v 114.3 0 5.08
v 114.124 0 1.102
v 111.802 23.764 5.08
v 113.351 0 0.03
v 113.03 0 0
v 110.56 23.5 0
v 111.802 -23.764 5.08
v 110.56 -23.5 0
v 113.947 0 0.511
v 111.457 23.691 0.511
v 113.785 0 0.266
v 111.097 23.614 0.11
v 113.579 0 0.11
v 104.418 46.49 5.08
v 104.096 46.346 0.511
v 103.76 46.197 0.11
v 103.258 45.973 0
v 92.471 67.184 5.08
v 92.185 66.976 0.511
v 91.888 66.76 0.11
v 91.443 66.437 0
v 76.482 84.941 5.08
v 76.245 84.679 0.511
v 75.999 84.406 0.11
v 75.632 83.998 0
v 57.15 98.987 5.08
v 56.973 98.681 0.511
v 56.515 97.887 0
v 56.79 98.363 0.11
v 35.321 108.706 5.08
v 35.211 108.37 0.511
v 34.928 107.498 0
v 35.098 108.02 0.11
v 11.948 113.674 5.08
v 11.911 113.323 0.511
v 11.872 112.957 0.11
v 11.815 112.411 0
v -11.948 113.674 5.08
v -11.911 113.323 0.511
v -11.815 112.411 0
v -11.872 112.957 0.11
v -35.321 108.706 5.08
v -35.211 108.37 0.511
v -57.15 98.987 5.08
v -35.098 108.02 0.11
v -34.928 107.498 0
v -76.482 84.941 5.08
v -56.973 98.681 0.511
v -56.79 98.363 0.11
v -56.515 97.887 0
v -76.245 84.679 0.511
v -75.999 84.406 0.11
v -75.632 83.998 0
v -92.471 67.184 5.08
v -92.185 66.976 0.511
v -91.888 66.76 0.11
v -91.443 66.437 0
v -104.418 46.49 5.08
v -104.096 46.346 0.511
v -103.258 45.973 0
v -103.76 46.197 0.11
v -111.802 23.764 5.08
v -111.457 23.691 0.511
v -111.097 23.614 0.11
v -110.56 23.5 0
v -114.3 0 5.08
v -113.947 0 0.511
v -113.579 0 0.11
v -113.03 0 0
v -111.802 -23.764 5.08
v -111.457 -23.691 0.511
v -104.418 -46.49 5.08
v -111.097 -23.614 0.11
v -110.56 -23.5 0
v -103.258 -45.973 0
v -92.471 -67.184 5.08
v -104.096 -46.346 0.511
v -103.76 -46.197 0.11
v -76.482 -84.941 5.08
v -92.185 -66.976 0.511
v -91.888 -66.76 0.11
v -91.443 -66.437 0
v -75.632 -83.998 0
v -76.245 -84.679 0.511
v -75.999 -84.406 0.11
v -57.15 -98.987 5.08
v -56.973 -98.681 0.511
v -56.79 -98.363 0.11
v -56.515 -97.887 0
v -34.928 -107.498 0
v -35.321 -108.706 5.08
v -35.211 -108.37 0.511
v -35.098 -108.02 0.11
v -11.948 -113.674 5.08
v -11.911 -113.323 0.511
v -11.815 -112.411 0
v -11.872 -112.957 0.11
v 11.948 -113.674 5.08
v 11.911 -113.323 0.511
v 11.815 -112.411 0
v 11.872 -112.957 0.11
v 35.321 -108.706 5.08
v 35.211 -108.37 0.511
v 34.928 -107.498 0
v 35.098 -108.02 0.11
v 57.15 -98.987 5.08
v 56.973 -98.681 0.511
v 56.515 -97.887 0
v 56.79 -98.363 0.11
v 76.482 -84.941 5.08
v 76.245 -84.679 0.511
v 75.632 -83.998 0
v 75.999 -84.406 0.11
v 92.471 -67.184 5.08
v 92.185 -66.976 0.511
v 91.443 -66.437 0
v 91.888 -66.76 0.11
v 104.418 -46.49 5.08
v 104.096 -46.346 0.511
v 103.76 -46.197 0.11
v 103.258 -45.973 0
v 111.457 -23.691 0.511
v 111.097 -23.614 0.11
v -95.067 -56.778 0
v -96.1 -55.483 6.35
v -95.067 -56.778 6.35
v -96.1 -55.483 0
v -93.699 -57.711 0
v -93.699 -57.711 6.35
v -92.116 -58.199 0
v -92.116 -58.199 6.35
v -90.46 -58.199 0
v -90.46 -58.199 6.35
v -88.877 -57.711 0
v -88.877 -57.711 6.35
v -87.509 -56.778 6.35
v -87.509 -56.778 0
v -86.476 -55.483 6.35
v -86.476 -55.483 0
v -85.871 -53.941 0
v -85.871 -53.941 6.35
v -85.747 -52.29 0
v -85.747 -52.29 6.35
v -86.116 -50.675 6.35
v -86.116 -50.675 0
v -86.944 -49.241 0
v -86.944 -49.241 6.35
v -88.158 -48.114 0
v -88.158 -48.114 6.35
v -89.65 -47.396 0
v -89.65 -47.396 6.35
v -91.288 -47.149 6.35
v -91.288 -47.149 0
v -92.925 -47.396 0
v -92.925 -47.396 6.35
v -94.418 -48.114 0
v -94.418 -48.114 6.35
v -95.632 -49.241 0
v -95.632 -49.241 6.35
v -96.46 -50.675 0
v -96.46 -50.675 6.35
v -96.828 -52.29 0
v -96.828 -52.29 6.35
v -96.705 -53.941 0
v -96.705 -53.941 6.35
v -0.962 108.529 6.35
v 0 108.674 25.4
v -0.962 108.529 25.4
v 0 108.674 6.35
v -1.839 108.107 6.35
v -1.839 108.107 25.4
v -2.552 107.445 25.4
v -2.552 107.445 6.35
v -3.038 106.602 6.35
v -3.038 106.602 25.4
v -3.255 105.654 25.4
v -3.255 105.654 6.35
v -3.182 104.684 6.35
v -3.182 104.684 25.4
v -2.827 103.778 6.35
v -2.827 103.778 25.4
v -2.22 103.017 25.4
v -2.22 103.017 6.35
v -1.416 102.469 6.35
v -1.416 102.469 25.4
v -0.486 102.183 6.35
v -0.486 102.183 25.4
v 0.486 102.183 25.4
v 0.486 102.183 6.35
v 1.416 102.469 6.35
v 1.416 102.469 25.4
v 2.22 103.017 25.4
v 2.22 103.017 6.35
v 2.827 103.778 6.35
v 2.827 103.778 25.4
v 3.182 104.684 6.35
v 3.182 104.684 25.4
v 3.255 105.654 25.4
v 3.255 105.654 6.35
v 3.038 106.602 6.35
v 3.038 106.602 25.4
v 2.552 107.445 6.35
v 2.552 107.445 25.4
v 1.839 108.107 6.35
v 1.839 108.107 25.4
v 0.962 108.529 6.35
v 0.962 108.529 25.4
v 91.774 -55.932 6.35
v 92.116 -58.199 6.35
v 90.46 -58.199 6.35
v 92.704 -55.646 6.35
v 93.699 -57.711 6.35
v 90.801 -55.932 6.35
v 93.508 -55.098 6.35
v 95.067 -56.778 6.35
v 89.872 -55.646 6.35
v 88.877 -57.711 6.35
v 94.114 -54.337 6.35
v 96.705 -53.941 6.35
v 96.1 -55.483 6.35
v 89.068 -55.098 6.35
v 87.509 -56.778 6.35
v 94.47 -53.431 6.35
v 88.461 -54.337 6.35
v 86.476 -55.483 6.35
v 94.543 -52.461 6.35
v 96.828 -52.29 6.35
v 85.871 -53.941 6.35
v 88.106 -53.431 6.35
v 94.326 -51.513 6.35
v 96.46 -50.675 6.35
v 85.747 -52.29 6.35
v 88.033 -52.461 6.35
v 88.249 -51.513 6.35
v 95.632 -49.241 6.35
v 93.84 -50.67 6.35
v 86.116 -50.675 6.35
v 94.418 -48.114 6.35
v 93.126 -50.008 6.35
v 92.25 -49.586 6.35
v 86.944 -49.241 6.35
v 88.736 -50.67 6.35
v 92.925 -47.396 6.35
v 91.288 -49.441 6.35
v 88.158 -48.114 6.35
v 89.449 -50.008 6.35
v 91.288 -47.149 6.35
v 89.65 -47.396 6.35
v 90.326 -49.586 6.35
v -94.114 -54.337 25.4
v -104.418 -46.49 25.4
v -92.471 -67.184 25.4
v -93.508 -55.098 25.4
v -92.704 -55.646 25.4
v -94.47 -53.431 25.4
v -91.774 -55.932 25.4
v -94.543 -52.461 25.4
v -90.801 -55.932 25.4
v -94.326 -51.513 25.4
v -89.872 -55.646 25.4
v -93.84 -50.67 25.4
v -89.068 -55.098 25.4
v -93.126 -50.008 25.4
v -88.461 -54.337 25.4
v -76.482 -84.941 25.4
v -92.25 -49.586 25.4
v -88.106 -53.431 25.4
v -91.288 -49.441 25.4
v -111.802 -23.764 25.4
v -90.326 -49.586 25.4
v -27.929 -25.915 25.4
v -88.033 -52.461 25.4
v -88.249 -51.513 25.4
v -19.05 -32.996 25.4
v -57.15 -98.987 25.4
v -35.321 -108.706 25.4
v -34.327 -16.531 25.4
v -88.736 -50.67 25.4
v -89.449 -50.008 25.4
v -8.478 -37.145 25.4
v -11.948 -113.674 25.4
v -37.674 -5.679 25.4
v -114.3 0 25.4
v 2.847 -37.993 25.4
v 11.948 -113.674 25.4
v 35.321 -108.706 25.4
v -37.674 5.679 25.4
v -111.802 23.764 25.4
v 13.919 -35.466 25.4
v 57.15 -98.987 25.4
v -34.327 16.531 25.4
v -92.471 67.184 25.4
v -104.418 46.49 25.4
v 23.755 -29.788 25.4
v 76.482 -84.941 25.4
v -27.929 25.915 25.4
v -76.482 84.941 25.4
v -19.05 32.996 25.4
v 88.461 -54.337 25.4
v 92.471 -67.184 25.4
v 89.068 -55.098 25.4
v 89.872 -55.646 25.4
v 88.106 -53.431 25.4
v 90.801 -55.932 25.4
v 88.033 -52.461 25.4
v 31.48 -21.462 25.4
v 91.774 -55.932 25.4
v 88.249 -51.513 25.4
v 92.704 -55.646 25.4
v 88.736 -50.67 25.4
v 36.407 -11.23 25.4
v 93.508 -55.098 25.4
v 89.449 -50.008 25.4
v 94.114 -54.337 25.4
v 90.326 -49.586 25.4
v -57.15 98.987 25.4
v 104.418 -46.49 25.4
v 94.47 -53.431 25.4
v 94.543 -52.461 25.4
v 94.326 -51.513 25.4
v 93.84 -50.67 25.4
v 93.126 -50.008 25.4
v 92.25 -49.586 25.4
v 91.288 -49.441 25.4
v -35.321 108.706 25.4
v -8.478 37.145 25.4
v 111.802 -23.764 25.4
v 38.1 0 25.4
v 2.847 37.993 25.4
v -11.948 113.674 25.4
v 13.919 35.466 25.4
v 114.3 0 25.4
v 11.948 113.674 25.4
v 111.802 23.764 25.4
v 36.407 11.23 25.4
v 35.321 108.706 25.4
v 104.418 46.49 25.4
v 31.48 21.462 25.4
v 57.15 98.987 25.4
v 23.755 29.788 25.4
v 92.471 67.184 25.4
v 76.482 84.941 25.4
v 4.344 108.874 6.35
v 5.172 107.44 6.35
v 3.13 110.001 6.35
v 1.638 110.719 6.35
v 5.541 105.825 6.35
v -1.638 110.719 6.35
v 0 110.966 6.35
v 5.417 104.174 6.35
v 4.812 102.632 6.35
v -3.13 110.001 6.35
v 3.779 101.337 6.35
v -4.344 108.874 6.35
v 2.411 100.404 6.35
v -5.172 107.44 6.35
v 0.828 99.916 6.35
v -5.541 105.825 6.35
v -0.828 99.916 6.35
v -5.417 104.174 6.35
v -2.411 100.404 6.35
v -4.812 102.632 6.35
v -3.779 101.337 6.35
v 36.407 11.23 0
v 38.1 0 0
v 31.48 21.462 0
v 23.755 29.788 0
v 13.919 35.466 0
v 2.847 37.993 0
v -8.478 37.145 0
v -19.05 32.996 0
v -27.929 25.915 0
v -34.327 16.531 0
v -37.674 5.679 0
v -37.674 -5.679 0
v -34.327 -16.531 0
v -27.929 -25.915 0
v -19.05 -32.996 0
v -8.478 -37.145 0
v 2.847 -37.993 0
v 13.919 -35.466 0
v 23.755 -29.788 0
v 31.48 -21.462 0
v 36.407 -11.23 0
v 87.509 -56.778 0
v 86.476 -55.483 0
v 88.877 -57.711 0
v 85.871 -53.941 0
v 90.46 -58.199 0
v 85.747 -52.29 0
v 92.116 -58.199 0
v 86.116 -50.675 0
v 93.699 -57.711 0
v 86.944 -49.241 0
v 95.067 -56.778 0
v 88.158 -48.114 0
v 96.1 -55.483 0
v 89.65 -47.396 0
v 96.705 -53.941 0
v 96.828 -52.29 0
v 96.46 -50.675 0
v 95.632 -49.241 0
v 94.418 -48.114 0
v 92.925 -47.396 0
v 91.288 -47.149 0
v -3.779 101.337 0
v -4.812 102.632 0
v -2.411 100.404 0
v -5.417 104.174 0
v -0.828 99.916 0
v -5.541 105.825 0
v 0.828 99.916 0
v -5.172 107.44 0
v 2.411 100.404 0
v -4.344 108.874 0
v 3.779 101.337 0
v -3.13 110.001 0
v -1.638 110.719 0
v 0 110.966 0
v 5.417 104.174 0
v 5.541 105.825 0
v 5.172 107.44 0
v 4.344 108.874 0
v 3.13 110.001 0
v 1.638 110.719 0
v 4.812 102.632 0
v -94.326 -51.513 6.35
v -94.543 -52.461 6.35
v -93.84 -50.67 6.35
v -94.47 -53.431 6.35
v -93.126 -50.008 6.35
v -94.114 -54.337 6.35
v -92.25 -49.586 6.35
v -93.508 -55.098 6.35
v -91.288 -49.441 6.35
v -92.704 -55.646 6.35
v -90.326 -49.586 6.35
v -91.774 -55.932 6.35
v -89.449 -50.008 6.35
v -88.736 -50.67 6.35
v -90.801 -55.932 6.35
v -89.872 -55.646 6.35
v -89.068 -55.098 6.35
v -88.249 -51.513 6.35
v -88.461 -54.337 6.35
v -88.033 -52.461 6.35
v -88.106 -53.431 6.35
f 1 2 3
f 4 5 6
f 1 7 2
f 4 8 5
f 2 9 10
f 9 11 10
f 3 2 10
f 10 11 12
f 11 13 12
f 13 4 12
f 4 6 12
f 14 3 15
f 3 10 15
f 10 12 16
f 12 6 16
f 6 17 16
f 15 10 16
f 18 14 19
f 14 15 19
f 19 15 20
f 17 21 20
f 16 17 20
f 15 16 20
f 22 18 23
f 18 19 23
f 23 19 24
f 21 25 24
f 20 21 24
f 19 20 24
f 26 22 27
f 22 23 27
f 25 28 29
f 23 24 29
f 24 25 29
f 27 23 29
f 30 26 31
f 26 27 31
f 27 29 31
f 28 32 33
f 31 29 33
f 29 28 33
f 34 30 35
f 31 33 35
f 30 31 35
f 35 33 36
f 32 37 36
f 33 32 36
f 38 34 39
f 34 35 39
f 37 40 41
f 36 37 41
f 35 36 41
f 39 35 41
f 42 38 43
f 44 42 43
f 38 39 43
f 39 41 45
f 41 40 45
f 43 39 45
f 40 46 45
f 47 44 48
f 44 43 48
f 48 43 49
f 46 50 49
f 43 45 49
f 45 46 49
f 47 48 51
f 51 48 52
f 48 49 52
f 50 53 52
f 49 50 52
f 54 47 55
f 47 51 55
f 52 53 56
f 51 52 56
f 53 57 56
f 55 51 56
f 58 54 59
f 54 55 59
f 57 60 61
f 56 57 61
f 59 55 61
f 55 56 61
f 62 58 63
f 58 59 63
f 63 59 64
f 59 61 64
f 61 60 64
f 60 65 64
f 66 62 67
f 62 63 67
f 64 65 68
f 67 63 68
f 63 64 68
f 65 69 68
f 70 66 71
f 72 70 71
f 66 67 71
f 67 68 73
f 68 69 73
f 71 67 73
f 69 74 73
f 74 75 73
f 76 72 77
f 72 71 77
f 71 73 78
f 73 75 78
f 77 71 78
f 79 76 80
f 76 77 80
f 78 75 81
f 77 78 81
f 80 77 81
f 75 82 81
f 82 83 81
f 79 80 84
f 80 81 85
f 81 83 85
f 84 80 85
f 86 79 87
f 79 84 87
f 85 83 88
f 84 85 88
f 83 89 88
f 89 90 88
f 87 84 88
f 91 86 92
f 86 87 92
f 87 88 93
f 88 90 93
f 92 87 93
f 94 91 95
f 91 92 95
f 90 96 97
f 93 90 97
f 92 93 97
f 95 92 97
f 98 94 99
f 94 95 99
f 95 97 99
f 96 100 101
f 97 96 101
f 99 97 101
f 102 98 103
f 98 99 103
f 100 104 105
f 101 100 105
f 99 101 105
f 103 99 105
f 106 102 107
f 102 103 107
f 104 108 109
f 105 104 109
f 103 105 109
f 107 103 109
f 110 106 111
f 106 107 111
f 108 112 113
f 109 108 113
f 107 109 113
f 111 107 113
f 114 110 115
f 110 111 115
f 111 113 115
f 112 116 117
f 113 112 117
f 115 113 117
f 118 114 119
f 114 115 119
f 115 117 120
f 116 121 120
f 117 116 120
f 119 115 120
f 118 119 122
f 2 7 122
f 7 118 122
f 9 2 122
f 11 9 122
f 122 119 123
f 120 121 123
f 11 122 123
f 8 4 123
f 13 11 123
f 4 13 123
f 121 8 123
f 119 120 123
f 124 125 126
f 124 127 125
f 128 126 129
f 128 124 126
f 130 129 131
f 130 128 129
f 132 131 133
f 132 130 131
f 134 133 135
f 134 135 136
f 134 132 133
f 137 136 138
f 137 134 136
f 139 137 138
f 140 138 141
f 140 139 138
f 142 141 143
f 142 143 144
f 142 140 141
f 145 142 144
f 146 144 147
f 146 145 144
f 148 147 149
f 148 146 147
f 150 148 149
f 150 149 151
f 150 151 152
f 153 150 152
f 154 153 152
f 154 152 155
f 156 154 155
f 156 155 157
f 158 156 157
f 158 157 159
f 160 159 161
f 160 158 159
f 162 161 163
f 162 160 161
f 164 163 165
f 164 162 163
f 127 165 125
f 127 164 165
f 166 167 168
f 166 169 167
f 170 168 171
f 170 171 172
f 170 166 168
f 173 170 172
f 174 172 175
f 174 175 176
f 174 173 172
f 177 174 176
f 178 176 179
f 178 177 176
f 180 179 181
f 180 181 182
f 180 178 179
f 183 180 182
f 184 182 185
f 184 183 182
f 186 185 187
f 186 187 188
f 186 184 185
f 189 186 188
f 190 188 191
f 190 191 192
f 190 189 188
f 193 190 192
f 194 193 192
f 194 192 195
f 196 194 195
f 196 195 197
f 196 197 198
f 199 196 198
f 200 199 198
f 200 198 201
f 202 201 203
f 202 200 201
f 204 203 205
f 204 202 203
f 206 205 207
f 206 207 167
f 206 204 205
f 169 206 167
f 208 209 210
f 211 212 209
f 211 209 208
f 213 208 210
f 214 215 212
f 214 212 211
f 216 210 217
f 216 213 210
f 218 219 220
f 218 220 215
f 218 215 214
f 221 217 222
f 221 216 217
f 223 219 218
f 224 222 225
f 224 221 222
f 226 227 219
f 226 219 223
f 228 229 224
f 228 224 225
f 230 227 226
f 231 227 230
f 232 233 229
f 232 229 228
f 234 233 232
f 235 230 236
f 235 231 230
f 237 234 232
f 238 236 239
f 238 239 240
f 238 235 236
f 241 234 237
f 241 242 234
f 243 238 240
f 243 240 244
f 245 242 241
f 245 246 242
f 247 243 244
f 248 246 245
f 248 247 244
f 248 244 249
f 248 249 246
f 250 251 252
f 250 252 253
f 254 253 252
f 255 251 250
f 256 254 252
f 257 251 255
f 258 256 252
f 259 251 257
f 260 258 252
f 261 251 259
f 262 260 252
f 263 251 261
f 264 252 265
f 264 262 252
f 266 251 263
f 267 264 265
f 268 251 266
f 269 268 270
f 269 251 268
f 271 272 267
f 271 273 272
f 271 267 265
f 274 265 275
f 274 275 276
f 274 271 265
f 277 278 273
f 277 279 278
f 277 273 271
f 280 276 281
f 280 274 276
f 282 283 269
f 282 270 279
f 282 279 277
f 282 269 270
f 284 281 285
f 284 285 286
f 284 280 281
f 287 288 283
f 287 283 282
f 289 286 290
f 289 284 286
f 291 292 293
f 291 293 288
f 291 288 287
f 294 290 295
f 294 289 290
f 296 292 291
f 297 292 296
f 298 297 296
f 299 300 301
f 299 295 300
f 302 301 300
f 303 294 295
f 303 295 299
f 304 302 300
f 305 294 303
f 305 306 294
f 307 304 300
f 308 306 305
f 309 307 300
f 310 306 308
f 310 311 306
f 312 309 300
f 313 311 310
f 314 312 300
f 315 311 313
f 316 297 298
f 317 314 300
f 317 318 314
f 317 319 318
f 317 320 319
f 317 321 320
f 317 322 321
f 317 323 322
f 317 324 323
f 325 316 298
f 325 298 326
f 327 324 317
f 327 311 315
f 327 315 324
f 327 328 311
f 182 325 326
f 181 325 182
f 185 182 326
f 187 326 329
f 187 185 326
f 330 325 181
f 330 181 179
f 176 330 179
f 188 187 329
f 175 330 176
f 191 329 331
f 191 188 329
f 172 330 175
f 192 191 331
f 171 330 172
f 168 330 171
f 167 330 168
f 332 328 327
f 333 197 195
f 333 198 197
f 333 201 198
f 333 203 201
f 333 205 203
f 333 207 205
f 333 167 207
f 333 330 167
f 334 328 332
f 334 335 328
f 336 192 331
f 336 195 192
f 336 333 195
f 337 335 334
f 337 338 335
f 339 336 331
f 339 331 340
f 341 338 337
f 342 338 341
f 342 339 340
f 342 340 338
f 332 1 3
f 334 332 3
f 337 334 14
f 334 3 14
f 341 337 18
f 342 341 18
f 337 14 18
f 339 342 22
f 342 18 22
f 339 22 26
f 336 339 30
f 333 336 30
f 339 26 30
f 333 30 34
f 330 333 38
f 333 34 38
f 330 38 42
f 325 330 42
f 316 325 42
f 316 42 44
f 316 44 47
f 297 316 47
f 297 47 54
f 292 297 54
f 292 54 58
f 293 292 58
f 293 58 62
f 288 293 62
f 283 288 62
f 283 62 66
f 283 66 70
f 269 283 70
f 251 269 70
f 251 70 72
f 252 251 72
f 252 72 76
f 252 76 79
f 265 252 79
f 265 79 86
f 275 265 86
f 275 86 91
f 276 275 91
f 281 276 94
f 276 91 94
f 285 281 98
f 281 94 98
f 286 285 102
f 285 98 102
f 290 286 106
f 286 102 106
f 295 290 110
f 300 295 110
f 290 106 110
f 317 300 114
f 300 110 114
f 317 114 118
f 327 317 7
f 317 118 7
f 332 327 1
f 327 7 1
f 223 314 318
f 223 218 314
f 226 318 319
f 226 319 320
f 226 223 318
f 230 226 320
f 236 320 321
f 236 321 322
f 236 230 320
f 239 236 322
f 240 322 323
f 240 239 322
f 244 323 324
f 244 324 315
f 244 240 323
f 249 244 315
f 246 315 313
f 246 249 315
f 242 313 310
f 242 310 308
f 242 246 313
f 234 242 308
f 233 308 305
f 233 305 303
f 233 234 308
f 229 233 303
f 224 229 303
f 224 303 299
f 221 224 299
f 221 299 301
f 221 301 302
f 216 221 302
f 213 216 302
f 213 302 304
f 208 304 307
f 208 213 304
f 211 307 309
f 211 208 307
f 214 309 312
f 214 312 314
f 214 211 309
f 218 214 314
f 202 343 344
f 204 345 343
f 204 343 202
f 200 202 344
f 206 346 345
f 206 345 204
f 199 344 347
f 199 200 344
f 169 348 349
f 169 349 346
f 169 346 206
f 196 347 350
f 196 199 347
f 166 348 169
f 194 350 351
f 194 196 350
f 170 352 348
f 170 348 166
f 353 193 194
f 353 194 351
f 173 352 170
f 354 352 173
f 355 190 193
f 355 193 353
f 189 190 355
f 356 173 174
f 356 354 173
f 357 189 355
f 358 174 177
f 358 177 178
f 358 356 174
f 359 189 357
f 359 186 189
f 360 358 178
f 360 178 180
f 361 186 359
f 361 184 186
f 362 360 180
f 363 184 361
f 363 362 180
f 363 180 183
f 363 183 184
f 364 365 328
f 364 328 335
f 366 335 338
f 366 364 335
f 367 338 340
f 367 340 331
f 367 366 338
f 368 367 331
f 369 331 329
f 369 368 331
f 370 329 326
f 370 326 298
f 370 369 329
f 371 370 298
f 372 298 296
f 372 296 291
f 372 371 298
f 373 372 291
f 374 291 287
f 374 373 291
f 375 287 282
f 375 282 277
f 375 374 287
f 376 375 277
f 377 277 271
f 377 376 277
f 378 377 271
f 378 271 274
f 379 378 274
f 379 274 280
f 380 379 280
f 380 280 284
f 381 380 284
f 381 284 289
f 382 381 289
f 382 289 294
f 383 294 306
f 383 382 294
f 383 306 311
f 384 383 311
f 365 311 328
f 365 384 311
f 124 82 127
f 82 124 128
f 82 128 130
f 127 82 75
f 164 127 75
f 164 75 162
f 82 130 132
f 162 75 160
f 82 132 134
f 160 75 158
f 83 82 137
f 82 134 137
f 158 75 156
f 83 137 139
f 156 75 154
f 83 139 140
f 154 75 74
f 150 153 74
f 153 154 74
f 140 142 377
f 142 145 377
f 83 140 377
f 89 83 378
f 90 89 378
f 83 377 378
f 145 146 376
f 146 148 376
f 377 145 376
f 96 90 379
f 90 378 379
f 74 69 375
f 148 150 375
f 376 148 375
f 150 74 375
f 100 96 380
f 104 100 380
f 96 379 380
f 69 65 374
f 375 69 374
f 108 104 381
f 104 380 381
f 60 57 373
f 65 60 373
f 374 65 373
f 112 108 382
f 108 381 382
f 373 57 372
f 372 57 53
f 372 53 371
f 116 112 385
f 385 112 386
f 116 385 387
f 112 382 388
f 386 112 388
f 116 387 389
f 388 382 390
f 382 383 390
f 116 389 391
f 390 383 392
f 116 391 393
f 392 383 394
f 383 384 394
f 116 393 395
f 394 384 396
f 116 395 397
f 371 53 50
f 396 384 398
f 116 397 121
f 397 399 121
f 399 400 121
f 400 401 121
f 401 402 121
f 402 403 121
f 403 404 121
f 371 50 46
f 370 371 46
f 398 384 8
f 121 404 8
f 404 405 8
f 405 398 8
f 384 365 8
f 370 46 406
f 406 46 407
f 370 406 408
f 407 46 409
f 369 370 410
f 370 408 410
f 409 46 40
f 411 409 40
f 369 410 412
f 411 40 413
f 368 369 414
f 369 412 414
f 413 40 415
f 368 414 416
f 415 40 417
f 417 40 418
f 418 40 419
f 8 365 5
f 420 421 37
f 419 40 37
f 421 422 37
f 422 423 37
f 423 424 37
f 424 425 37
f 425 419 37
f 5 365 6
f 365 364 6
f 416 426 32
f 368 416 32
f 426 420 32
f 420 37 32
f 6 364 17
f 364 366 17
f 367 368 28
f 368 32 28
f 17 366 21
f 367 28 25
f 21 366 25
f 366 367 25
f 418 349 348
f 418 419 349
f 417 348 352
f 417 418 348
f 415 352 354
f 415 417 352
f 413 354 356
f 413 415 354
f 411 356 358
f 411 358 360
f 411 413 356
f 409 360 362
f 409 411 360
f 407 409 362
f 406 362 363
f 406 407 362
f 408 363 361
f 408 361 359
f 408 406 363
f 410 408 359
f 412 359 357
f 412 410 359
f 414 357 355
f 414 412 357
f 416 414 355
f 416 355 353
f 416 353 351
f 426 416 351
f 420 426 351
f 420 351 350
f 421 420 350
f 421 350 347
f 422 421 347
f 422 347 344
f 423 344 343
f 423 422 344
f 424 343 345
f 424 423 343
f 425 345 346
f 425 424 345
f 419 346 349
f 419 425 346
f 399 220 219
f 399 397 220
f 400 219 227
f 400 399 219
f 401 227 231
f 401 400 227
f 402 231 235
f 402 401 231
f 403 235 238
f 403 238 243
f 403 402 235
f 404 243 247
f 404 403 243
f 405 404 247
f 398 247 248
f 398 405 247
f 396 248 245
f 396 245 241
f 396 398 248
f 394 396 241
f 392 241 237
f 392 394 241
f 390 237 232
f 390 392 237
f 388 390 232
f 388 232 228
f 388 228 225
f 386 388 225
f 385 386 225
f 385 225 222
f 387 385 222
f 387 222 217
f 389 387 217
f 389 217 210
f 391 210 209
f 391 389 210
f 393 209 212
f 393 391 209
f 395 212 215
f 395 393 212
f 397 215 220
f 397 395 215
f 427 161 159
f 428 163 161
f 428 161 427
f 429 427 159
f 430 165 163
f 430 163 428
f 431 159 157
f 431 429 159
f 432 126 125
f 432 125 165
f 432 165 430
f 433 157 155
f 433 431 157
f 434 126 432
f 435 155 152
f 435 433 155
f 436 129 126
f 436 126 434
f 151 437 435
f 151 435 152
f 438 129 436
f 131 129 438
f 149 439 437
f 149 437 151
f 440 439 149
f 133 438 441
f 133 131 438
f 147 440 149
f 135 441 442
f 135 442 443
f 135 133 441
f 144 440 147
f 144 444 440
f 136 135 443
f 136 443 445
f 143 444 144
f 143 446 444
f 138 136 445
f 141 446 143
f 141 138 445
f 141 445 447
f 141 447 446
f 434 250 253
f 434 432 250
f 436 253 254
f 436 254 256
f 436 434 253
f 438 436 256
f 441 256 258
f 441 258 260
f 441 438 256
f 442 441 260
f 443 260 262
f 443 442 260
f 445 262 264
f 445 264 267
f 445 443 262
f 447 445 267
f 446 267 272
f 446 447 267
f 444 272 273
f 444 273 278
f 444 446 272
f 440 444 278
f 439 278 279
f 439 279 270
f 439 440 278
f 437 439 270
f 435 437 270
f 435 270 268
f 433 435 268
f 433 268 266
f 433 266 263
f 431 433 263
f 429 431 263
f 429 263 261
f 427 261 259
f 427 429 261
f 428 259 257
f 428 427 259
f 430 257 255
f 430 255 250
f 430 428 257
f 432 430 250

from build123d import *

# Parameters (mm, degrees)
SKETCH1_R           = 114.3
SKETCH1_R_2         = 38.1
BOSS_EXTRUDE1_DEPTH = 25.4
CIRPATTERN1_COUNT   = 3
FILLET1_SIZE        = 5.08
FILLET1_SIZE_2      = 1.27


with BuildPart() as part:
    # Sketch1 → Boss-Extrude1 (new body)
    with BuildSketch(Plane.XY):
        Circle(SKETCH1_R)
        Circle(SKETCH1_R_2, mode=Mode.SUBTRACT)
    extrude(amount=BOSS_EXTRUDE1_DEPTH)

    # Sketch5 → CBORE for 1/4 Socket Head Cap Screw1 (revolve, cut)
    with BuildSketch(Plane(origin=(0, 105.41, 0), x_dir=(0, 1, 0), z_dir=(1, 0, 0))):
        Polygon((0, 0), (0, 27.361148974), (3.2639, 25.4), (3.2639, 6.35), (5.55625, 6.35), (5.55625, 0), align=None)
    cbore_for_1_4_socket_head_cap_screw1 = revolve(axis=Axis((0, 105.41, -6.35), (0, 0, 1)), mode=Mode.SUBTRACT)

    # CirPattern1: CBORE for 1/4 Socket Head Cap Screw1 ×3 about axis
    cirpattern1_axis = Axis((0, 0, 0), (0, 0, 1))
    for i in range(1, CIRPATTERN1_COUNT):
        add(cbore_for_1_4_socket_head_cap_screw1.rotate(cirpattern1_axis, i * 360 / CIRPATTERN1_COUNT), mode=Mode.SUBTRACT)

    # Fillet1
    # a fillet whose section is not a circle: 5.08, 1.27 mm, written as the material it takes off along each edge
    with BuildSketch(Plane(origin=(0, 0, 0), x_dir=(1, 0, 0), z_dir=(0, -1, 0))) as fillet1_piece_1:
        with BuildLine():
            Bezier((114.3, FILLET1_SIZE), (114.3, 0), (114.3 - FILLET1_SIZE_2, 0), weights=[1, 1.857142857, 1])
            Line((114.3 - FILLET1_SIZE_2, 0), (113.03, -0.1016))
            Line((113.03, -0.1016), (114.4016, -0.1016))
            Line((114.4016, -0.1016), (114.4016, 5.08))
            Line((114.4016, 5.08), (114.3, FILLET1_SIZE))
        make_face()
    revolve(axis=Axis((0, 0, 0), (0, 0, 1)), mode=Mode.SUBTRACT)


solid = part.part
